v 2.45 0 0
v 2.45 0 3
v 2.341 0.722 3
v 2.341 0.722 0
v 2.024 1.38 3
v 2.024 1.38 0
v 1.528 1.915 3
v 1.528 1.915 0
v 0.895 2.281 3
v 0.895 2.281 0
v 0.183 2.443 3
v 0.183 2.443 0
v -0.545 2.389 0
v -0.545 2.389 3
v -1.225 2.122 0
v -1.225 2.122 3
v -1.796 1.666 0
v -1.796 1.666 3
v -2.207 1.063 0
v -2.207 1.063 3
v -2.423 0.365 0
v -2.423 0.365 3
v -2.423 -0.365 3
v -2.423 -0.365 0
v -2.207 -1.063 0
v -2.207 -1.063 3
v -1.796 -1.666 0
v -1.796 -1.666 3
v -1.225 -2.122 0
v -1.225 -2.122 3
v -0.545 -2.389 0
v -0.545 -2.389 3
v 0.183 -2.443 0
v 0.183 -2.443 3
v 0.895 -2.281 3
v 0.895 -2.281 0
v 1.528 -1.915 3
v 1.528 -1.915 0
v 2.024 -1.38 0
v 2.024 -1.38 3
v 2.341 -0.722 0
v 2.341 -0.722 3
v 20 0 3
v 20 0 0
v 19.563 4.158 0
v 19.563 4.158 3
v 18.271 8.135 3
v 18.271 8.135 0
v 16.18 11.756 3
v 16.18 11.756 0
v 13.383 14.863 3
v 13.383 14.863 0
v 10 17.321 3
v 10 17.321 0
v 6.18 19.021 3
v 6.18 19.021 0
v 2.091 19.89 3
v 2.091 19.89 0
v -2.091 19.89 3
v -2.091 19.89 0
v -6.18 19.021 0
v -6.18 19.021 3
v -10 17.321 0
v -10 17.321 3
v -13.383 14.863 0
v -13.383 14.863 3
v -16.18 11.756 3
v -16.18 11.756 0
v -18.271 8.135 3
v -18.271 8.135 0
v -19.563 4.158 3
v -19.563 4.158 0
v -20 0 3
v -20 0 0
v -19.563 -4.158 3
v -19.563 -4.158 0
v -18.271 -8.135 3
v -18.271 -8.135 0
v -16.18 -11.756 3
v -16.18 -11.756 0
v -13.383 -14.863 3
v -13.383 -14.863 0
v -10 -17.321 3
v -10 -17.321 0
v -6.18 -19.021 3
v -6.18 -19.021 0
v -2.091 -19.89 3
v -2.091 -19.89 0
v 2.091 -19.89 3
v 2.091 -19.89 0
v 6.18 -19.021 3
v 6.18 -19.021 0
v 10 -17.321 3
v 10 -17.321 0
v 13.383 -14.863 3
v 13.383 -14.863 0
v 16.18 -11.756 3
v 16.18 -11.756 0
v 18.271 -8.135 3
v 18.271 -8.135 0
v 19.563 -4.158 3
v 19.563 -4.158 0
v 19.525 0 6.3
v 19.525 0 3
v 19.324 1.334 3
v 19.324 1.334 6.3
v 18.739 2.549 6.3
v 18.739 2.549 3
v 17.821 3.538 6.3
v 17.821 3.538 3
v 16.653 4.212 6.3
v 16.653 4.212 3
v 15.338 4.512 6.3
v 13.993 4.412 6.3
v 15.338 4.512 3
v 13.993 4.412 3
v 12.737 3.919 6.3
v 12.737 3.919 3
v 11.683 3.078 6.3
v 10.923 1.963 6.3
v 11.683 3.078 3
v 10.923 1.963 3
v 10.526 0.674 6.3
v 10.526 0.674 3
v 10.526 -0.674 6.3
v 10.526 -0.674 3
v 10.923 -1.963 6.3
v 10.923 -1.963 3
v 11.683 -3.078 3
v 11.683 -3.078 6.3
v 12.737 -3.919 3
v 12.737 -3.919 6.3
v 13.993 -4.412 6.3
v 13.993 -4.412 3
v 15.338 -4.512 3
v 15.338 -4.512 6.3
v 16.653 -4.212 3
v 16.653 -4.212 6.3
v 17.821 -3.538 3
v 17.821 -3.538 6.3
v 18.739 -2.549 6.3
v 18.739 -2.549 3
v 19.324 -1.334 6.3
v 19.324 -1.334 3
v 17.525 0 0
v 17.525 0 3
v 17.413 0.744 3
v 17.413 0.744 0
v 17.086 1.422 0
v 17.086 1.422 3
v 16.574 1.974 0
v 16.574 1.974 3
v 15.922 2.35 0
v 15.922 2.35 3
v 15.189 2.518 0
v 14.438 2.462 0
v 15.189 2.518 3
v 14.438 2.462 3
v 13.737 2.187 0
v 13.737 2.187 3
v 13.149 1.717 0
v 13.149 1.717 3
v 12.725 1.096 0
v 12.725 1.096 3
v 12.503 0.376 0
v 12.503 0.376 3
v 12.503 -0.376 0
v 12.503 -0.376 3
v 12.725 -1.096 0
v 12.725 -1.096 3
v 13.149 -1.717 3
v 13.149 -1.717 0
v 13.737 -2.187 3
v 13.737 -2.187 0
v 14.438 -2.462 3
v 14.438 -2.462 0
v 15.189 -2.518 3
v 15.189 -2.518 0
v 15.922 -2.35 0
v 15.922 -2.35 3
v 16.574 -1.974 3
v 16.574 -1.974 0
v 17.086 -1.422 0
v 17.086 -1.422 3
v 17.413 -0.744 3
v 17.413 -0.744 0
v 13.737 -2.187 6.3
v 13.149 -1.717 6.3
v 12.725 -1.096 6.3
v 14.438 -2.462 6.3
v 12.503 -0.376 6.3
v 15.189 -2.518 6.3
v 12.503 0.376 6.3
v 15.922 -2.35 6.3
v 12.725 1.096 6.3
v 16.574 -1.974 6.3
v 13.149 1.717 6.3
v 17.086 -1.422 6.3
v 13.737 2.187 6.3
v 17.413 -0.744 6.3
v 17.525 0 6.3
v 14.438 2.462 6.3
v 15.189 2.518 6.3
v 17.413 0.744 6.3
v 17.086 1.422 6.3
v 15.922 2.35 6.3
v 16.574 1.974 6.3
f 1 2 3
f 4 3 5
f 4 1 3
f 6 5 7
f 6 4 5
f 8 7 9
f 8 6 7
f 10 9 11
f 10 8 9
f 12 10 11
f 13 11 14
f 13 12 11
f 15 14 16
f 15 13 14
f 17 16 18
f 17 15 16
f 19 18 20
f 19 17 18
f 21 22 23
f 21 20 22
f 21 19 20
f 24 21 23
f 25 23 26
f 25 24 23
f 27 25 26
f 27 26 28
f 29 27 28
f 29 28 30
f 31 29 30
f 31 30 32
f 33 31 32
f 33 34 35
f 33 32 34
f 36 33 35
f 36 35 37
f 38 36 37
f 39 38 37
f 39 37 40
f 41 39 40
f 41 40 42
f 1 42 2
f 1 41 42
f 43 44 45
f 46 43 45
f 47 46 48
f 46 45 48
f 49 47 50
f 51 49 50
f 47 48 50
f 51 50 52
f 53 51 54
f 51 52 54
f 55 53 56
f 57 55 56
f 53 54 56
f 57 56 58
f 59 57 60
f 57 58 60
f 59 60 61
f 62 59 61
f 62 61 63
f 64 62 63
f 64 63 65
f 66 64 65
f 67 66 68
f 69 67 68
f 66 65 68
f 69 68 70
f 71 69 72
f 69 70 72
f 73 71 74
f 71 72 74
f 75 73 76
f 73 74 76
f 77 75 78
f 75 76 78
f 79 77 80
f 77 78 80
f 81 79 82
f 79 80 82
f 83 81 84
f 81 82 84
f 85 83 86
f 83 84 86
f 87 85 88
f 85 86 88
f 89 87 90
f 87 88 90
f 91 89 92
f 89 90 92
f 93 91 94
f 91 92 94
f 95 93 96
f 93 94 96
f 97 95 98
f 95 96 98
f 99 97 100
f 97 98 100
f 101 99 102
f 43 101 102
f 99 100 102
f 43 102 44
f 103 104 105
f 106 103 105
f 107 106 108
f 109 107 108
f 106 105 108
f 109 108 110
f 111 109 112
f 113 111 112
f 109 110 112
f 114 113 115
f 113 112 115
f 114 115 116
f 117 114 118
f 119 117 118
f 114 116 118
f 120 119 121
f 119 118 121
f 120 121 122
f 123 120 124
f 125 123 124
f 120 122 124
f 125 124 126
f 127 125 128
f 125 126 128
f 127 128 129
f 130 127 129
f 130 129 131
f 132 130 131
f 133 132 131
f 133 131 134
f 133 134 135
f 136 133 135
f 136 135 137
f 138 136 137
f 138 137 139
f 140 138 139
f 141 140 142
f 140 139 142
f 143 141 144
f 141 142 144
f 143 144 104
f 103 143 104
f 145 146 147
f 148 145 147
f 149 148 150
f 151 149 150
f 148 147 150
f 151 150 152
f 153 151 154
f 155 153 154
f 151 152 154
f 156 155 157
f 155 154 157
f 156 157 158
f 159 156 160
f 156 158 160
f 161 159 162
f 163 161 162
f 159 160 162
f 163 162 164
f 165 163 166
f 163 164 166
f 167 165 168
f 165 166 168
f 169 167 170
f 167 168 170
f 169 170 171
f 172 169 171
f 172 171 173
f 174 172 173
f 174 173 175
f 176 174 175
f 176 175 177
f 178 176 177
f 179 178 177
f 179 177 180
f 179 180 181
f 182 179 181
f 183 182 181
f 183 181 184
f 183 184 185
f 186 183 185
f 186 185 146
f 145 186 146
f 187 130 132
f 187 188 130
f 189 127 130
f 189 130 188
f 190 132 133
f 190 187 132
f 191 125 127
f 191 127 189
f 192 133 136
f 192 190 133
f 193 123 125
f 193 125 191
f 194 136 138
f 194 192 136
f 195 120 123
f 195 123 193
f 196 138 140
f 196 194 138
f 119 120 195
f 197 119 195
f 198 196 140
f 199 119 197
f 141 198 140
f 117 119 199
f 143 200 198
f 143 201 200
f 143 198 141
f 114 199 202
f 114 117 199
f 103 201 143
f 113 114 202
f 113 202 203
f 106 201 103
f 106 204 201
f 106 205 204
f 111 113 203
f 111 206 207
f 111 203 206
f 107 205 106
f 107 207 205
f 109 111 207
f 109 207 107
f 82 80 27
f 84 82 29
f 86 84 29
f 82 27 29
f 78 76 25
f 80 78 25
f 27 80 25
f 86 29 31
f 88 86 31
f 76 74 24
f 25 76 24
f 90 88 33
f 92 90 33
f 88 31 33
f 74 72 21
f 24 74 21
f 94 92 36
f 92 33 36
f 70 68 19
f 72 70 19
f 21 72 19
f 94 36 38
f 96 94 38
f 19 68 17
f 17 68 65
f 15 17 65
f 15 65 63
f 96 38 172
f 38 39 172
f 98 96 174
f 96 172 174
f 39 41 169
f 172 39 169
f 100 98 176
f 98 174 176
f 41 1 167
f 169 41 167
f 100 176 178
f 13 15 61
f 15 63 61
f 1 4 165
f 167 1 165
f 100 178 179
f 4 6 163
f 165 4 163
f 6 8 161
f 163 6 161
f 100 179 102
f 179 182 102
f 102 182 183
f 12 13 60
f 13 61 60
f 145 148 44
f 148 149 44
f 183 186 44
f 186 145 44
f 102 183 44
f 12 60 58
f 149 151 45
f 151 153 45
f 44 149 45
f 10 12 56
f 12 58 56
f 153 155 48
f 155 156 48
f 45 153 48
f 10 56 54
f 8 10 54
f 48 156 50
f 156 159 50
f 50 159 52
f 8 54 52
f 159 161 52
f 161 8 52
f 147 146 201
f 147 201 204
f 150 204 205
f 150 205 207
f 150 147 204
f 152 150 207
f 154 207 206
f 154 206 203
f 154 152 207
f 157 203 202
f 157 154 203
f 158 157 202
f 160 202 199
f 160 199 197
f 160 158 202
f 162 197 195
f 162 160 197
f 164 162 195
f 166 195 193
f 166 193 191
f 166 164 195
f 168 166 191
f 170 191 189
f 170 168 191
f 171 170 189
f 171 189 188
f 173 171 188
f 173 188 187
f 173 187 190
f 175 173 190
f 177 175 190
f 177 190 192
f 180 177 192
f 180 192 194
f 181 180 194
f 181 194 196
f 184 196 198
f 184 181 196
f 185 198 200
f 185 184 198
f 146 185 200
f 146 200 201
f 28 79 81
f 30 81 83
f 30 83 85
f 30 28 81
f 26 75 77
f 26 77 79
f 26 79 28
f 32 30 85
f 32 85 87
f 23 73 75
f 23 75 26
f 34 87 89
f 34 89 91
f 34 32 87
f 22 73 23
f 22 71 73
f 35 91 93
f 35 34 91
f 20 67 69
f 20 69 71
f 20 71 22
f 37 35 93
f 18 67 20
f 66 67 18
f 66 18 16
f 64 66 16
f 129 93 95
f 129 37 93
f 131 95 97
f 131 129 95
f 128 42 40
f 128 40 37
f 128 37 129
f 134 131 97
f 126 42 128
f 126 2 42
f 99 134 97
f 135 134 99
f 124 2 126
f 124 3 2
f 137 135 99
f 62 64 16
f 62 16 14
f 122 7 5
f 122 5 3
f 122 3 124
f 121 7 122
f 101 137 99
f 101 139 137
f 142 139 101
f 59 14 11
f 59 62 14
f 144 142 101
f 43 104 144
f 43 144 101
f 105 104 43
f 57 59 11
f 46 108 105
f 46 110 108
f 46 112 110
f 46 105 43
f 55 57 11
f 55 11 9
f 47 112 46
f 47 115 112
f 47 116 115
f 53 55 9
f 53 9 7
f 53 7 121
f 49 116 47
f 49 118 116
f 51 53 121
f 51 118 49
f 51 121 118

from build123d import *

# Parameters (mm, degrees)
SKETCH1_R               = 20
BOSS_EXTRUDE1_DEPTH     = 3
CUT_EXTRUDE3_START      = 3
SKETCH2_R               = 2.525
CUT_EXTRUDE3_DEPTH      = 4
CUT_EXTRUDE3_DEPTH_BACK = 4
BOSS_EXTRUDE2_START     = 3
SKETCH3_R               = 4.525
SKETCH3_R_2             = 2.525
BOSS_EXTRUDE2_DEPTH     = 3.3
SKETCH4_R               = 2.45
CUT_EXTRUDE4_DEPTH      = 7.3


with BuildPart() as part:
    # Sketch1 → Boss-Extrude1 (new body)
    with BuildSketch(Plane.XY):
        Circle(SKETCH1_R)
    extrude(amount=BOSS_EXTRUDE1_DEPTH)

    # Sketch2 → Cut-Extrude3 (cut, two sides)
    with BuildSketch(Plane.XY.offset(CUT_EXTRUDE3_START)) as cut_extrude3_sk:
        with Locations((15, 0)):
            Circle(SKETCH2_R)
    extrude(amount=CUT_EXTRUDE3_DEPTH, mode=Mode.SUBTRACT)
    extrude(cut_extrude3_sk.sketch, amount=-CUT_EXTRUDE3_DEPTH_BACK, mode=Mode.SUBTRACT)

    # Sketch3 → Boss-Extrude2 (add)
    with BuildSketch(Plane.XY.offset(BOSS_EXTRUDE2_START)):
        with Locations((15, 0)):
            Circle(SKETCH3_R)
        with Locations((15, 0)):
            Circle(SKETCH3_R_2, mode=Mode.SUBTRACT)
    extrude(amount=BOSS_EXTRUDE2_DEPTH)

    # Sketch4 → Cut-Extrude4 (cut, through all)
    with BuildSketch(Plane.XY):
        Circle(SKETCH4_R)
    extrude(amount=CUT_EXTRUDE4_DEPTH, mode=Mode.SUBTRACT)


solid = part.part
